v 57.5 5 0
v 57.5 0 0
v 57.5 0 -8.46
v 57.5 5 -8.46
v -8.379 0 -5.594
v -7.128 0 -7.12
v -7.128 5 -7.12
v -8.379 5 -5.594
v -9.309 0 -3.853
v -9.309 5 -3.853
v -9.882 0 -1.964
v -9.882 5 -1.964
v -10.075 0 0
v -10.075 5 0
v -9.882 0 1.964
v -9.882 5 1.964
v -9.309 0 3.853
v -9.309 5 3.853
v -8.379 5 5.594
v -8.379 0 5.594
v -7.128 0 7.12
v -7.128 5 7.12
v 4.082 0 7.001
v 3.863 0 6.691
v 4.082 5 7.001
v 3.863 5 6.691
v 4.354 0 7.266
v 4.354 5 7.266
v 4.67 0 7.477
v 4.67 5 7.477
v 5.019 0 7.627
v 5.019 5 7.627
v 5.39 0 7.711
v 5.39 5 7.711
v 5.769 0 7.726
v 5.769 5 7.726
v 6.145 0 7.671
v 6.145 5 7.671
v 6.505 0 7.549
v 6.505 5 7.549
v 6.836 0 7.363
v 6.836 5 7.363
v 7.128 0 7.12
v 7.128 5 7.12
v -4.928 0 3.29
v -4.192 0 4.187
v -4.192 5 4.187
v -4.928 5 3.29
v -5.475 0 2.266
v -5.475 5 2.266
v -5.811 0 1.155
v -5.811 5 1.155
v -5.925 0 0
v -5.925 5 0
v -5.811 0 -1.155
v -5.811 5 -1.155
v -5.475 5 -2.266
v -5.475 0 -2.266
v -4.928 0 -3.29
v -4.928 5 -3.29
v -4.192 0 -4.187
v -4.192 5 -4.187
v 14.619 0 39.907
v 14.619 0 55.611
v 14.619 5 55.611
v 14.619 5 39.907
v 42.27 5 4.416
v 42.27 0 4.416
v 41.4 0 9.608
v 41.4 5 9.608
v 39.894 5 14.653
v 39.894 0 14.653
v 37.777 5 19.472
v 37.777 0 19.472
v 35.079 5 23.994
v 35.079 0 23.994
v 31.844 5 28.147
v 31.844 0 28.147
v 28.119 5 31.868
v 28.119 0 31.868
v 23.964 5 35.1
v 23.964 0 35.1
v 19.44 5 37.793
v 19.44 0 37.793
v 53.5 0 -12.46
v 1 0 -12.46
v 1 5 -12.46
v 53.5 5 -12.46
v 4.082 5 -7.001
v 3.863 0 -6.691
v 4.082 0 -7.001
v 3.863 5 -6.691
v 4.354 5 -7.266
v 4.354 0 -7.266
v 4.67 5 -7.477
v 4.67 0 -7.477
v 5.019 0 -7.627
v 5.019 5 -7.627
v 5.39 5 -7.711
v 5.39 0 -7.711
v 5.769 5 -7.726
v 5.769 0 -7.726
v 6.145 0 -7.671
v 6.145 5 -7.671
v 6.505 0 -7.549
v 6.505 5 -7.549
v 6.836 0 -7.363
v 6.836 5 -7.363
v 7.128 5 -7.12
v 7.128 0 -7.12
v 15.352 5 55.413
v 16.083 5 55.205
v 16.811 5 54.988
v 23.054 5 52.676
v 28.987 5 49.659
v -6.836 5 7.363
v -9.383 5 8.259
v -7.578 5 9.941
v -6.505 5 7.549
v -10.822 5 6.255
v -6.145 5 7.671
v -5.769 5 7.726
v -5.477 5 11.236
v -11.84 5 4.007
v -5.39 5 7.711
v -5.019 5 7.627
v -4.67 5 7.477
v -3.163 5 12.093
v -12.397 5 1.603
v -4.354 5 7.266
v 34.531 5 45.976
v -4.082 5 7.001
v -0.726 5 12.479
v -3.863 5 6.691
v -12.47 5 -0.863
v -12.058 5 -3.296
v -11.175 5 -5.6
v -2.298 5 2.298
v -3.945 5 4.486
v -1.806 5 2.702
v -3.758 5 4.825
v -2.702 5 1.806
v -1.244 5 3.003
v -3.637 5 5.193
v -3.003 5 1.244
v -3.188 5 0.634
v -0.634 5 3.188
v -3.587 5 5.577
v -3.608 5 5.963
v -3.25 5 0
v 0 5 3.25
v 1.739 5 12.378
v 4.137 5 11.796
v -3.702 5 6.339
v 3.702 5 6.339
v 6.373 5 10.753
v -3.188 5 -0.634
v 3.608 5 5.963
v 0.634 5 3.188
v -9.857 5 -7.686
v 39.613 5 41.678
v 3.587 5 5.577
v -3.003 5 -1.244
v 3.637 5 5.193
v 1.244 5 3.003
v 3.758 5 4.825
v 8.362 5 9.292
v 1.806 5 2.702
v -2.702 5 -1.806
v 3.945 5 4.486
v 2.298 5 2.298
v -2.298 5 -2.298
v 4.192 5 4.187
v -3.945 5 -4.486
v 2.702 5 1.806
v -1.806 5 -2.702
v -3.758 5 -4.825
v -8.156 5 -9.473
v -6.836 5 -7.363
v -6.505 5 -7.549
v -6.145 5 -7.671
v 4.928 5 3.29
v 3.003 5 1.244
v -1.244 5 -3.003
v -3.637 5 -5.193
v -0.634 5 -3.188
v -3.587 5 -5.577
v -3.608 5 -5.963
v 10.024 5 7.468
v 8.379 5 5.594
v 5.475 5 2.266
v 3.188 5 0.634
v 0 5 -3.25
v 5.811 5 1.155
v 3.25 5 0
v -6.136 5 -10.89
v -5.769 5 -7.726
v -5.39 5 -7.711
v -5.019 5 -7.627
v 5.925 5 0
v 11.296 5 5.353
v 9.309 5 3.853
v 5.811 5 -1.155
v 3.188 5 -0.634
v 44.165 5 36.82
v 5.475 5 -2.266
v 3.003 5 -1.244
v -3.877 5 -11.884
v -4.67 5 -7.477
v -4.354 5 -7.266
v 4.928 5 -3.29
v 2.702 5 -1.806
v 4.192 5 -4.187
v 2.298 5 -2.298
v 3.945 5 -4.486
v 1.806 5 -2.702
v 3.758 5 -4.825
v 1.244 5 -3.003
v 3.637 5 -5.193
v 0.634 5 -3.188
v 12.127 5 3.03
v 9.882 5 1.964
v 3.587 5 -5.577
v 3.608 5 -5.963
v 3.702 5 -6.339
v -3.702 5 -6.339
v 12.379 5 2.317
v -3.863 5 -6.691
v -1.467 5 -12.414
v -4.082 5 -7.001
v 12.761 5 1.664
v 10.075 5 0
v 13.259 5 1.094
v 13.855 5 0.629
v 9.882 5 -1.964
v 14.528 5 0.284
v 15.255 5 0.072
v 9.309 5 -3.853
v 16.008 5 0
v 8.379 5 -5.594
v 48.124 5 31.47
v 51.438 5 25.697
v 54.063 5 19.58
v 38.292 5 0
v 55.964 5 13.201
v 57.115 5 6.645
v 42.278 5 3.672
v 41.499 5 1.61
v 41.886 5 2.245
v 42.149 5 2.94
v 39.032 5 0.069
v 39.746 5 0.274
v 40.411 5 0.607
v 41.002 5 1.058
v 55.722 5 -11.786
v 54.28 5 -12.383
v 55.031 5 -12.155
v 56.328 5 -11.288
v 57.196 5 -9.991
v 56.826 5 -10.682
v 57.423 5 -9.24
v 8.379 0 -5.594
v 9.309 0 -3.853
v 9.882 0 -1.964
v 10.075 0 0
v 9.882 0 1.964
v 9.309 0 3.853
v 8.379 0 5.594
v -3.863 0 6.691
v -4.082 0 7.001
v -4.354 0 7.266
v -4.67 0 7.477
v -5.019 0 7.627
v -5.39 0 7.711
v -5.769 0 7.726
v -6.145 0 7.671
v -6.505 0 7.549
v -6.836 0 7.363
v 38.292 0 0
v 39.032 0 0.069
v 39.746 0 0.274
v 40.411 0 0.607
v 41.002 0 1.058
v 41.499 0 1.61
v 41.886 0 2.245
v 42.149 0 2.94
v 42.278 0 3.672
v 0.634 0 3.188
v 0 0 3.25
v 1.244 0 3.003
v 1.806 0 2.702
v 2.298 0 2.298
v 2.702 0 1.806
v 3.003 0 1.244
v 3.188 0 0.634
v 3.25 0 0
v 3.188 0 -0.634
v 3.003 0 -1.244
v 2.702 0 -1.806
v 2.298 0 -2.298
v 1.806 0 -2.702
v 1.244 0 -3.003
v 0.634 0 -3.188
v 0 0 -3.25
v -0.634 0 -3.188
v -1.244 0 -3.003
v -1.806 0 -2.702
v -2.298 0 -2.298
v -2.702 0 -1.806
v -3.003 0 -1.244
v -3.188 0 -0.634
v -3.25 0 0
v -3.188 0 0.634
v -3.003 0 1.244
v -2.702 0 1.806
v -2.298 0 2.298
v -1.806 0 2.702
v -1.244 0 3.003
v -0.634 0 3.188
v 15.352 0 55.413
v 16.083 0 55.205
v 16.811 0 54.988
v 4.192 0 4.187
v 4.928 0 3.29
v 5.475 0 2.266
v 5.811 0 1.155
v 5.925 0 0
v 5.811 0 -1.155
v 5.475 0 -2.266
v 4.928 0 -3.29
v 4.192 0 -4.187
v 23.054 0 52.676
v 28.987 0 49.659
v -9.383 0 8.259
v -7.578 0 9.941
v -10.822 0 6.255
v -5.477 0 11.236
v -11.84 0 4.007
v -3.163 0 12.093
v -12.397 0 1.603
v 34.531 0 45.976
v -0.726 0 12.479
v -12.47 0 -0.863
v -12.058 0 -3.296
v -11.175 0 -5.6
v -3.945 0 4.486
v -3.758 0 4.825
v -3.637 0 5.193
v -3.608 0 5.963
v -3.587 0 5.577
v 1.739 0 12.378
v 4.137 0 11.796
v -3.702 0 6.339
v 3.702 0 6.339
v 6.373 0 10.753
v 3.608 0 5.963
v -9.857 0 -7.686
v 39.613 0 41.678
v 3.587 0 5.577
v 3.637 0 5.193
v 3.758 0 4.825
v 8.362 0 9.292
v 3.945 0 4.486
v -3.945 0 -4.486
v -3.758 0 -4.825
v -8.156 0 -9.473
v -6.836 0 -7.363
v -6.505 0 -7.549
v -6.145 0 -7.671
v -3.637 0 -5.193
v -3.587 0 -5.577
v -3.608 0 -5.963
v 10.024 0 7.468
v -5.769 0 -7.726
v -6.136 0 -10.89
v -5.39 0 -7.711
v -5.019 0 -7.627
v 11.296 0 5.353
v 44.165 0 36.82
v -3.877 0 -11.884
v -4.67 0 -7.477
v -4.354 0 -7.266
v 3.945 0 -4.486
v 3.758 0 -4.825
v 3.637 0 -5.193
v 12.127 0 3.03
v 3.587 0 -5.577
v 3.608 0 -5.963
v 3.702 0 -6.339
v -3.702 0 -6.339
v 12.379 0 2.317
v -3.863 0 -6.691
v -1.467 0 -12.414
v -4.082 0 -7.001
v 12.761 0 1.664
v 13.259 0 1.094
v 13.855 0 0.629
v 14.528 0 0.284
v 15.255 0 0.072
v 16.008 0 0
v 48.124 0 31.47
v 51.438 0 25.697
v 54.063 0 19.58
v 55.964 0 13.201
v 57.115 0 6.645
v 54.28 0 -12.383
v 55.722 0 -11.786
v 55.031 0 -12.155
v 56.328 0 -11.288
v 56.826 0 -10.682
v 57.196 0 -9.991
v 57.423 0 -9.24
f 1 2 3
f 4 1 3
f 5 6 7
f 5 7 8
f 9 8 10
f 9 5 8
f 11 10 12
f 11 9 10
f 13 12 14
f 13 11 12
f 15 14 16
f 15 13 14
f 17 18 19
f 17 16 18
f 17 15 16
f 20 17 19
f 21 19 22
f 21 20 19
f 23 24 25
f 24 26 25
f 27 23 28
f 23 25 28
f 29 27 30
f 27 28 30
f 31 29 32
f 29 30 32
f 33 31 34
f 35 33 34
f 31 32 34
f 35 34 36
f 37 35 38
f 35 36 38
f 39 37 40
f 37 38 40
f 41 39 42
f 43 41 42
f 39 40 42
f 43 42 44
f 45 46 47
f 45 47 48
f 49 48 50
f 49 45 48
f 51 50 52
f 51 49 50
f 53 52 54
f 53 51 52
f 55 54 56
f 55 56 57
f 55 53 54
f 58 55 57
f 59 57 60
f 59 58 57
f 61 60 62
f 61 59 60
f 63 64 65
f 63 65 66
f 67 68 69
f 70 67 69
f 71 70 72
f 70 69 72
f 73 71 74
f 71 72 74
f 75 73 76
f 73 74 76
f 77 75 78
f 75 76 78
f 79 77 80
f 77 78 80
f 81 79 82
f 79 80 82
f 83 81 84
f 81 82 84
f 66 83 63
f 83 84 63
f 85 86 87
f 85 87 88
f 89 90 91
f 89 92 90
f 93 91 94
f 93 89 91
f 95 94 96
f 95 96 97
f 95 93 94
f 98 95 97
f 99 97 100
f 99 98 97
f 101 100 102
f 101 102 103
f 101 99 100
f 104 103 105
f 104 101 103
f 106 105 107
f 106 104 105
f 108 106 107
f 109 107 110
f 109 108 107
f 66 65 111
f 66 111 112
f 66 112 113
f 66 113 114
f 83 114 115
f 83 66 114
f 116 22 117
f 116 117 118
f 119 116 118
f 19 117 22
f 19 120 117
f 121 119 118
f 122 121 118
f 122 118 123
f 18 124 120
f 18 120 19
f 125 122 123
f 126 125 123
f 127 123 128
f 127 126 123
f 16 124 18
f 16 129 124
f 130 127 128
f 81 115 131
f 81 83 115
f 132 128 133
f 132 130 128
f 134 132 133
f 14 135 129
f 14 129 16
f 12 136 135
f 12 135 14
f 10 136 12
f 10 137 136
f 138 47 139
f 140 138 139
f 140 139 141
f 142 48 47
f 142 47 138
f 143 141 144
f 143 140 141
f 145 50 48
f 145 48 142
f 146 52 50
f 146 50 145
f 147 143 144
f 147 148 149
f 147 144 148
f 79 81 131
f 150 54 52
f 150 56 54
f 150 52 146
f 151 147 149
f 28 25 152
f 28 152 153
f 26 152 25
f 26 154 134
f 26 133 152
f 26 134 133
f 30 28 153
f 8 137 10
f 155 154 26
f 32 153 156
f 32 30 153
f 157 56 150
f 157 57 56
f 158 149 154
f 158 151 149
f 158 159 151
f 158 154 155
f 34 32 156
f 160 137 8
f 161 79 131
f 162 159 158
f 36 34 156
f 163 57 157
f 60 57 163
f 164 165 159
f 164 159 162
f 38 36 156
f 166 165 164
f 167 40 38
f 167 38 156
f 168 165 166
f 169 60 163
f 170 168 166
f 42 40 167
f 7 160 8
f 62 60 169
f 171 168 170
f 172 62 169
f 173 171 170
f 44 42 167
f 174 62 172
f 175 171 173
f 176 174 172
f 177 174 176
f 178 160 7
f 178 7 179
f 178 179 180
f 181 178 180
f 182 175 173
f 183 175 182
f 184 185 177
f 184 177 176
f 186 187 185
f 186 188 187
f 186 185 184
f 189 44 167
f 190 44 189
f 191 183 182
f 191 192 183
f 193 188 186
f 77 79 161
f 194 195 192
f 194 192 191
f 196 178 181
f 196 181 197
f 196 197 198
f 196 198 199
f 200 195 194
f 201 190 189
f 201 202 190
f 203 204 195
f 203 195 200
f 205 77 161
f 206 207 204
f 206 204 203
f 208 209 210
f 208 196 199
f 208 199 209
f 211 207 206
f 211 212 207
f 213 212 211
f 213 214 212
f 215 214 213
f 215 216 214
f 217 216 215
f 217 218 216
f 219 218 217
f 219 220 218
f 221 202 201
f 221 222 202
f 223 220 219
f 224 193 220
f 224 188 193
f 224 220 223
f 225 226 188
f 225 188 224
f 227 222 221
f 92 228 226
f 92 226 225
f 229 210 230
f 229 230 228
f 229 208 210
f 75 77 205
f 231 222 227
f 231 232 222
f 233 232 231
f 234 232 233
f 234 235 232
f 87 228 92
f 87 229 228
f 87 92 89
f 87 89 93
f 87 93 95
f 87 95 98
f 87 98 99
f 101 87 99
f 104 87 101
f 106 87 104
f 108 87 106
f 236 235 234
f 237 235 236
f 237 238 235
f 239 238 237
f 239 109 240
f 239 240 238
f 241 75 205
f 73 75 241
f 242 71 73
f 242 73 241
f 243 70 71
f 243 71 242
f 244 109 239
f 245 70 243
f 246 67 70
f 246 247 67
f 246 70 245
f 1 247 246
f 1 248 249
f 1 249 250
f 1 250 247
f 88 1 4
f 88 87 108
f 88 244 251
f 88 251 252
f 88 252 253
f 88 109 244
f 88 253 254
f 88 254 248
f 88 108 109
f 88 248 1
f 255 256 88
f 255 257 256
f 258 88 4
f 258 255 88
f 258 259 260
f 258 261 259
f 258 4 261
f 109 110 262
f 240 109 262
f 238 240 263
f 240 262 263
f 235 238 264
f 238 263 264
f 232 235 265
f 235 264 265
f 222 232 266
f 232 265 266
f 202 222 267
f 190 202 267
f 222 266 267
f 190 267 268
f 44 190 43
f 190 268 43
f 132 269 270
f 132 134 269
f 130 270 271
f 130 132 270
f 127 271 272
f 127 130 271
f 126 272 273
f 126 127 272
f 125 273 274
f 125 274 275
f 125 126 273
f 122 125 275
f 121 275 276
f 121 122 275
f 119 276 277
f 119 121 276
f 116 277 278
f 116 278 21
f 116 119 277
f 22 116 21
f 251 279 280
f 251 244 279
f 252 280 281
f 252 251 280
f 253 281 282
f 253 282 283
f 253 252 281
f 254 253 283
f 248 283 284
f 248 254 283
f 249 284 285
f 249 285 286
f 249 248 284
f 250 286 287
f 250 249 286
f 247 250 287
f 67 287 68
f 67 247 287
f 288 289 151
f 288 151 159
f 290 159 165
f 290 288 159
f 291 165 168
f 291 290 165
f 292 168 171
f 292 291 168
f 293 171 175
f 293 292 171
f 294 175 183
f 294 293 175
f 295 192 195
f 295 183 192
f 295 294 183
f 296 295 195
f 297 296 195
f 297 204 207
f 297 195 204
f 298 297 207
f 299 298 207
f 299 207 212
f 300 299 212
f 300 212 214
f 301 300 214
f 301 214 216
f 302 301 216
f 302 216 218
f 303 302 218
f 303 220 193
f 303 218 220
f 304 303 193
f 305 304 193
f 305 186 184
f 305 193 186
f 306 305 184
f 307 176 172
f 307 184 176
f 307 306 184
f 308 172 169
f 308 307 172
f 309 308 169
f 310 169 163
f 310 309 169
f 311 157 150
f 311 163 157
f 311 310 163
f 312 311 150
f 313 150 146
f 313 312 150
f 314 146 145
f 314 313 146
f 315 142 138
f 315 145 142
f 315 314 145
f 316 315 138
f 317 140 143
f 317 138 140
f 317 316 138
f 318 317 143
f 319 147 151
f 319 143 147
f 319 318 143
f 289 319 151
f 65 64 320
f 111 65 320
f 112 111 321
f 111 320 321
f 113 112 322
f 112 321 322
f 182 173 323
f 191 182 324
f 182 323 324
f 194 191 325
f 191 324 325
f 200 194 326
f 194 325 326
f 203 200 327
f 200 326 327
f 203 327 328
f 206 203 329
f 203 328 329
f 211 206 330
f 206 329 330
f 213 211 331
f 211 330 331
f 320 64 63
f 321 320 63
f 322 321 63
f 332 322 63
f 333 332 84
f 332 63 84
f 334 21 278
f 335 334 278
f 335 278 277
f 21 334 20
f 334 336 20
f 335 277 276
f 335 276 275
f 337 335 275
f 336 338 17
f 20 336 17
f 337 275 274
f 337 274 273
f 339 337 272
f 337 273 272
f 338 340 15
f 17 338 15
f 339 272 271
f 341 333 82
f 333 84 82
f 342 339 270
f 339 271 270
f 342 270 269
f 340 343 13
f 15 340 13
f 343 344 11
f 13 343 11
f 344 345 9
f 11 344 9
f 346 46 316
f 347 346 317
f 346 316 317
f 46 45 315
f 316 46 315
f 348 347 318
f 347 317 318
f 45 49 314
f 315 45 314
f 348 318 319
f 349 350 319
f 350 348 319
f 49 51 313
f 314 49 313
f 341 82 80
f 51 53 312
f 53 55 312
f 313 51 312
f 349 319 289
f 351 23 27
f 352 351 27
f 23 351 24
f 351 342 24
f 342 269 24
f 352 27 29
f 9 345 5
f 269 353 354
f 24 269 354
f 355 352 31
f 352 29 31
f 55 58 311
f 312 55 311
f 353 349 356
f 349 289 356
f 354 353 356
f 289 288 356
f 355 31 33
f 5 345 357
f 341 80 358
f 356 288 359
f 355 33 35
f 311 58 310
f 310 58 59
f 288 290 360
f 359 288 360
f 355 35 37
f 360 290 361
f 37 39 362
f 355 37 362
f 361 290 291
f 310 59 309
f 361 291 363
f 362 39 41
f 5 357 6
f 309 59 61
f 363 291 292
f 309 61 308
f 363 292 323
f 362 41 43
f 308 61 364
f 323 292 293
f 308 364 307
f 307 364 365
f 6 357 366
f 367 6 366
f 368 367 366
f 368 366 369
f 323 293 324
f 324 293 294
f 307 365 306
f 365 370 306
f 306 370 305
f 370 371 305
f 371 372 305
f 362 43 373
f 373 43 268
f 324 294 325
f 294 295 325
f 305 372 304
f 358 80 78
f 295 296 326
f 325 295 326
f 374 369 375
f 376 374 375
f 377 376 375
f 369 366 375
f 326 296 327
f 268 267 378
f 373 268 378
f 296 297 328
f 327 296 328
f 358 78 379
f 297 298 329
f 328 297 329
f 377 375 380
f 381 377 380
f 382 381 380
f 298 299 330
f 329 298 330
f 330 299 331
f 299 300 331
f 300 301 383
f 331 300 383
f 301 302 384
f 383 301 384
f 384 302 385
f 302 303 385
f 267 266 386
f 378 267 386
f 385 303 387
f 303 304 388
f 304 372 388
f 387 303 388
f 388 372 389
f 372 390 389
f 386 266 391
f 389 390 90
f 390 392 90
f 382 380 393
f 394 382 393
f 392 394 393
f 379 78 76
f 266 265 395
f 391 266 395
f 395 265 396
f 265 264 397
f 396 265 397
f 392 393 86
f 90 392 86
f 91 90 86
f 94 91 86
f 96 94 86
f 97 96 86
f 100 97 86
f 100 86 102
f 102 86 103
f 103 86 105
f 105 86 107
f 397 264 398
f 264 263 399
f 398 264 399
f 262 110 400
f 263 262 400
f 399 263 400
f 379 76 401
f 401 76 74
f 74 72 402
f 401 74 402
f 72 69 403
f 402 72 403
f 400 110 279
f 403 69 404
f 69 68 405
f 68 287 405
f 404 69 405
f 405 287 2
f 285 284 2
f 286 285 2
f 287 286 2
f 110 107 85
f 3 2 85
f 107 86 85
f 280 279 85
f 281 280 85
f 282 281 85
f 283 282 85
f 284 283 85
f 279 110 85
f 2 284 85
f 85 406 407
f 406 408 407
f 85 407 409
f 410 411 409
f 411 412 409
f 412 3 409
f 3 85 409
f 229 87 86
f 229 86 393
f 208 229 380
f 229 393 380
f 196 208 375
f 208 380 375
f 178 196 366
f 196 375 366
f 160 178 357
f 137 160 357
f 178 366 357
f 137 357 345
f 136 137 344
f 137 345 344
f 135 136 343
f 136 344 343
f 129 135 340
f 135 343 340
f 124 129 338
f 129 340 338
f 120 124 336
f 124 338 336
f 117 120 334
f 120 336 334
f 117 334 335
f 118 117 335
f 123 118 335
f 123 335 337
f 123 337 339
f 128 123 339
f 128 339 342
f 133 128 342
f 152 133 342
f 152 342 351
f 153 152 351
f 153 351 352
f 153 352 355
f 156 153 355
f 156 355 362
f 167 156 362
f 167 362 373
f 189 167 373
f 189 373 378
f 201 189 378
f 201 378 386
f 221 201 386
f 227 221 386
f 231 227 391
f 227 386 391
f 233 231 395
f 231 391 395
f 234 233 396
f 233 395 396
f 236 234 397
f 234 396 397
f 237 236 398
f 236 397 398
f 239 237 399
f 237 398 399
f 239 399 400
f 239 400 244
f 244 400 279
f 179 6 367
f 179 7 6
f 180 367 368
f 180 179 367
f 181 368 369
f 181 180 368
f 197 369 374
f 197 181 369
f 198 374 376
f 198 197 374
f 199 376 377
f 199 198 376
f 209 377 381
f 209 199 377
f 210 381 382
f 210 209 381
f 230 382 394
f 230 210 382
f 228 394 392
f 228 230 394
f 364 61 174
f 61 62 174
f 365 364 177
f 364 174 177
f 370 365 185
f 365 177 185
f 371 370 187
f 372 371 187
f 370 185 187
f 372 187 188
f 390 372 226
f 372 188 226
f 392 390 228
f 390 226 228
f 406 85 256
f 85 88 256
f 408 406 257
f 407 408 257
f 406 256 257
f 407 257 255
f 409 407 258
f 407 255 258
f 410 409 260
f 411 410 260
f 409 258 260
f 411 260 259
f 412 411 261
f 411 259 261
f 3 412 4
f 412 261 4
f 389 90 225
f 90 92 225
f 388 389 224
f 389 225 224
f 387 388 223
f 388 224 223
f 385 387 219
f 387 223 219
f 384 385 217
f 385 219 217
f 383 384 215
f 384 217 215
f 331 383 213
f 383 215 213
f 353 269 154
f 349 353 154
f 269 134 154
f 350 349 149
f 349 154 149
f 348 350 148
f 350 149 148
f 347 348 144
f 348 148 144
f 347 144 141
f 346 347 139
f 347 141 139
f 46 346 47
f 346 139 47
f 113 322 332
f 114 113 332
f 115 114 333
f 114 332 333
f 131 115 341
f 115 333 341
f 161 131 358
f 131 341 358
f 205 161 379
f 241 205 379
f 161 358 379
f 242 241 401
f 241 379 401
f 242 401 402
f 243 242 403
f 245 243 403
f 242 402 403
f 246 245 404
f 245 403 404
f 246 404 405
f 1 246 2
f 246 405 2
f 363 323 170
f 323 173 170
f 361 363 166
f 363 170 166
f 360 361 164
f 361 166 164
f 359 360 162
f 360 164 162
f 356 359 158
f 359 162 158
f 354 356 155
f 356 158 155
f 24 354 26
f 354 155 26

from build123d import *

# Parameters (mm, degrees)
SKETCH1_R               = 12.5
BOSS_EXTRUDE1_DEPTH     = 5
EXTRUDE_THIN1_DEPTH     = 5
SKETCH6_W               = 56.5
SKETCH6_H               = 12.459935794
BOSS_EXTRUDE3_DEPTH     = 5
CUT_EXTRUDE3_DEPTH      = 80.717487022
CUT_EXTRUDE3_DEPTH_BACK = 80.717487022
SKETCH7_R               = 3.25
CUT_EXTRUDE_THIN1_START = -5
CUT_EXTRUDE_THIN1_DEPTH = 85.717487022
FILLET1_R               = 2.075
FILLET2_R               = 4
BOSS_EXTRUDE4_DEPTH     = 5
SKETCH9_4_W             = 9.626496109
SKETCH9_4_H             = 23.122525611
CUT_EXTRUDE5_DEPTH      = 81.602542459


with BuildPart() as part:
    # Sketch1 → Boss-Extrude1 (new body)
    with BuildSketch(Plane(origin=(0, 0, 0), x_dir=(1, 0, 0), z_dir=(0, 1, 0))):
        with Locations(Location((0, 0, 0), (0, 0, 270))):
            Circle(SKETCH1_R)
    extrude(amount=BOSS_EXTRUDE1_DEPTH)



with BuildPart() as body_2:
    # Sketch4 → Extrude-Thin1 (new body)
    with BuildSketch(Plane(origin=(0, 0, 0), x_dir=(1, 0, 0), z_dir=(0, 1, 0))):
        with BuildLine():
            ThreePointArc((16.811373022, -54.987523468), (46.221769485, -34.202310238), (57.5, 0))
            Line((57.5, 0), (42.5, 0))
            ThreePointArc((42.5, 0), (34.163916576, -25.279968437), (12.425797451, -40.642952128))
            Line((12.425797451, -40.642952128), (16.811373022, -54.987523468))
        make_face()
    extrude(amount=EXTRUDE_THIN1_DEPTH)


with BuildPart() as part_1:
    add(part.part)

    add(body_2.part)  # Boss-Extrude3 merges body 2
    # Sketch6 → Boss-Extrude3 (add)
    with BuildSketch(Plane(origin=(0, 0, 0), x_dir=(1, 0, 0), z_dir=(0, 1, 0))):
        with Locations((29.25, 6.229967897)):
            Rectangle(SKETCH6_W, SKETCH6_H)
    extrude(amount=BOSS_EXTRUDE3_DEPTH)

    # Sketch7 → Cut-Extrude3 (cut, two sides: drawn at the far end of the back side and taken through both)
    with BuildSketch(Plane(origin=(0, 5, 0), x_dir=(1, 0, 0), z_dir=(0, 1, 0)).offset(-CUT_EXTRUDE3_DEPTH_BACK)):
        with Locations(Location((0, 0, 0), (0, 0, 270))):
            Circle(SKETCH7_R)
    extrude(amount=CUT_EXTRUDE3_DEPTH + CUT_EXTRUDE3_DEPTH_BACK, mode=Mode.SUBTRACT)

    # Sketch8 → Cut-Extrude-Thin1 (cut)
    with BuildSketch(Plane(origin=(0, 5, 0), x_dir=(1, 0, 0), z_dir=(0, 1, 0)).offset(CUT_EXTRUDE_THIN1_START)):
        with BuildLine():
            ThreePointArc((-5.0375, 8.725205943), (-10.075, 0), (-5.0375, -8.725205943))
            Line((-5.0375, -8.725205943), (-2.9625, -5.131200517))
            ThreePointArc((-2.9625, -5.131200517), (-5.925, 0), (-2.9625, 5.131200517))
            Line((-2.9625, 5.131200517), (-5.0375, 8.725205943))
        make_face()
    cut_extrude_thin1 = extrude(amount=CUT_EXTRUDE_THIN1_DEPTH, mode=Mode.SUBTRACT)

    # Mirror2: Cut-Extrude-Thin1 across plane
    add(cut_extrude_thin1.mirror(Plane(origin=(0, 0, 0), x_dir=(0, 0, 1), z_dir=(1, 0, 0))), mode=Mode.SUBTRACT)

    # Fillet1
    fillet1_edges = [part_1.edges().sort_by_distance(p)[0] for p in [
        (2.9625, 2.5, -5.131200517),
        (5.0375, 2.5, -8.725205943),
        (-5.0375, 2.5, -8.725205943),
        (-2.9625, 2.5, -5.131200517),
        (2.9625, 2.5, 5.131200517),
        (5.0375, 2.5, 8.725205943),
        (-5.0375, 2.5, 8.725205943),
        (-2.9625, 2.5, 5.131200517),
    ]]
    fillet(fillet1_edges, radius=FILLET1_R - 0.0001)  # a hair under: the kernel refuses the full size

    # Fillet2
    fillet2_edges = [part_1.edges().sort_by_distance(p)[0] for p in [
        (42.5, 2.5, 0),
        (12.5, 2.5, 0),
        (57.5, 2.5, -12.459935794),
    ]]
    fillet(fillet2_edges, radius=FILLET2_R)

    # Sketch9 → Boss-Extrude4 (add)
    with BuildSketch(Plane(origin=(0, 0, 0), x_dir=(1, 0, 0), z_dir=(0, 1, 0))):
        with BuildLine():
            Line((16.811373022, -54.987523468), (14.618585236, -47.815237798))
            Line((14.618585236, -47.815237798), (14.618585236, -55.610673128))
            ThreePointArc((14.618585236, -55.610673128), (15.718067562, -55.309966119), (16.811373022, -54.987523468))
        make_face()
        with BuildLine():
            Line((14.618585236, -47.815237798), (12.425797451, -40.642952128))
            Line((12.425797451, -40.642952128), (11.862973877, -56.262952738))
            ThreePointArc((11.862973877, -56.262952738), (13.244795598, -55.953779046), (14.618585236, -55.610673128))
            Line((14.618585236, -55.610673128), (14.618585236, -47.815237798))
        make_face()
    extrude(amount=BOSS_EXTRUDE4_DEPTH)

    # Sketch9<4> → Cut-Extrude5 (cut, through all)
    with BuildSketch(Plane(origin=(0, 0, 0), x_dir=(1, 0, 0), z_dir=(0, 1, 0))):
        with Locations((9.805337182, -49.150976699)):
            Rectangle(SKETCH9_4_W, SKETCH9_4_H)
    extrude(amount=CUT_EXTRUDE5_DEPTH, mode=Mode.SUBTRACT)


solid = part_1.part
